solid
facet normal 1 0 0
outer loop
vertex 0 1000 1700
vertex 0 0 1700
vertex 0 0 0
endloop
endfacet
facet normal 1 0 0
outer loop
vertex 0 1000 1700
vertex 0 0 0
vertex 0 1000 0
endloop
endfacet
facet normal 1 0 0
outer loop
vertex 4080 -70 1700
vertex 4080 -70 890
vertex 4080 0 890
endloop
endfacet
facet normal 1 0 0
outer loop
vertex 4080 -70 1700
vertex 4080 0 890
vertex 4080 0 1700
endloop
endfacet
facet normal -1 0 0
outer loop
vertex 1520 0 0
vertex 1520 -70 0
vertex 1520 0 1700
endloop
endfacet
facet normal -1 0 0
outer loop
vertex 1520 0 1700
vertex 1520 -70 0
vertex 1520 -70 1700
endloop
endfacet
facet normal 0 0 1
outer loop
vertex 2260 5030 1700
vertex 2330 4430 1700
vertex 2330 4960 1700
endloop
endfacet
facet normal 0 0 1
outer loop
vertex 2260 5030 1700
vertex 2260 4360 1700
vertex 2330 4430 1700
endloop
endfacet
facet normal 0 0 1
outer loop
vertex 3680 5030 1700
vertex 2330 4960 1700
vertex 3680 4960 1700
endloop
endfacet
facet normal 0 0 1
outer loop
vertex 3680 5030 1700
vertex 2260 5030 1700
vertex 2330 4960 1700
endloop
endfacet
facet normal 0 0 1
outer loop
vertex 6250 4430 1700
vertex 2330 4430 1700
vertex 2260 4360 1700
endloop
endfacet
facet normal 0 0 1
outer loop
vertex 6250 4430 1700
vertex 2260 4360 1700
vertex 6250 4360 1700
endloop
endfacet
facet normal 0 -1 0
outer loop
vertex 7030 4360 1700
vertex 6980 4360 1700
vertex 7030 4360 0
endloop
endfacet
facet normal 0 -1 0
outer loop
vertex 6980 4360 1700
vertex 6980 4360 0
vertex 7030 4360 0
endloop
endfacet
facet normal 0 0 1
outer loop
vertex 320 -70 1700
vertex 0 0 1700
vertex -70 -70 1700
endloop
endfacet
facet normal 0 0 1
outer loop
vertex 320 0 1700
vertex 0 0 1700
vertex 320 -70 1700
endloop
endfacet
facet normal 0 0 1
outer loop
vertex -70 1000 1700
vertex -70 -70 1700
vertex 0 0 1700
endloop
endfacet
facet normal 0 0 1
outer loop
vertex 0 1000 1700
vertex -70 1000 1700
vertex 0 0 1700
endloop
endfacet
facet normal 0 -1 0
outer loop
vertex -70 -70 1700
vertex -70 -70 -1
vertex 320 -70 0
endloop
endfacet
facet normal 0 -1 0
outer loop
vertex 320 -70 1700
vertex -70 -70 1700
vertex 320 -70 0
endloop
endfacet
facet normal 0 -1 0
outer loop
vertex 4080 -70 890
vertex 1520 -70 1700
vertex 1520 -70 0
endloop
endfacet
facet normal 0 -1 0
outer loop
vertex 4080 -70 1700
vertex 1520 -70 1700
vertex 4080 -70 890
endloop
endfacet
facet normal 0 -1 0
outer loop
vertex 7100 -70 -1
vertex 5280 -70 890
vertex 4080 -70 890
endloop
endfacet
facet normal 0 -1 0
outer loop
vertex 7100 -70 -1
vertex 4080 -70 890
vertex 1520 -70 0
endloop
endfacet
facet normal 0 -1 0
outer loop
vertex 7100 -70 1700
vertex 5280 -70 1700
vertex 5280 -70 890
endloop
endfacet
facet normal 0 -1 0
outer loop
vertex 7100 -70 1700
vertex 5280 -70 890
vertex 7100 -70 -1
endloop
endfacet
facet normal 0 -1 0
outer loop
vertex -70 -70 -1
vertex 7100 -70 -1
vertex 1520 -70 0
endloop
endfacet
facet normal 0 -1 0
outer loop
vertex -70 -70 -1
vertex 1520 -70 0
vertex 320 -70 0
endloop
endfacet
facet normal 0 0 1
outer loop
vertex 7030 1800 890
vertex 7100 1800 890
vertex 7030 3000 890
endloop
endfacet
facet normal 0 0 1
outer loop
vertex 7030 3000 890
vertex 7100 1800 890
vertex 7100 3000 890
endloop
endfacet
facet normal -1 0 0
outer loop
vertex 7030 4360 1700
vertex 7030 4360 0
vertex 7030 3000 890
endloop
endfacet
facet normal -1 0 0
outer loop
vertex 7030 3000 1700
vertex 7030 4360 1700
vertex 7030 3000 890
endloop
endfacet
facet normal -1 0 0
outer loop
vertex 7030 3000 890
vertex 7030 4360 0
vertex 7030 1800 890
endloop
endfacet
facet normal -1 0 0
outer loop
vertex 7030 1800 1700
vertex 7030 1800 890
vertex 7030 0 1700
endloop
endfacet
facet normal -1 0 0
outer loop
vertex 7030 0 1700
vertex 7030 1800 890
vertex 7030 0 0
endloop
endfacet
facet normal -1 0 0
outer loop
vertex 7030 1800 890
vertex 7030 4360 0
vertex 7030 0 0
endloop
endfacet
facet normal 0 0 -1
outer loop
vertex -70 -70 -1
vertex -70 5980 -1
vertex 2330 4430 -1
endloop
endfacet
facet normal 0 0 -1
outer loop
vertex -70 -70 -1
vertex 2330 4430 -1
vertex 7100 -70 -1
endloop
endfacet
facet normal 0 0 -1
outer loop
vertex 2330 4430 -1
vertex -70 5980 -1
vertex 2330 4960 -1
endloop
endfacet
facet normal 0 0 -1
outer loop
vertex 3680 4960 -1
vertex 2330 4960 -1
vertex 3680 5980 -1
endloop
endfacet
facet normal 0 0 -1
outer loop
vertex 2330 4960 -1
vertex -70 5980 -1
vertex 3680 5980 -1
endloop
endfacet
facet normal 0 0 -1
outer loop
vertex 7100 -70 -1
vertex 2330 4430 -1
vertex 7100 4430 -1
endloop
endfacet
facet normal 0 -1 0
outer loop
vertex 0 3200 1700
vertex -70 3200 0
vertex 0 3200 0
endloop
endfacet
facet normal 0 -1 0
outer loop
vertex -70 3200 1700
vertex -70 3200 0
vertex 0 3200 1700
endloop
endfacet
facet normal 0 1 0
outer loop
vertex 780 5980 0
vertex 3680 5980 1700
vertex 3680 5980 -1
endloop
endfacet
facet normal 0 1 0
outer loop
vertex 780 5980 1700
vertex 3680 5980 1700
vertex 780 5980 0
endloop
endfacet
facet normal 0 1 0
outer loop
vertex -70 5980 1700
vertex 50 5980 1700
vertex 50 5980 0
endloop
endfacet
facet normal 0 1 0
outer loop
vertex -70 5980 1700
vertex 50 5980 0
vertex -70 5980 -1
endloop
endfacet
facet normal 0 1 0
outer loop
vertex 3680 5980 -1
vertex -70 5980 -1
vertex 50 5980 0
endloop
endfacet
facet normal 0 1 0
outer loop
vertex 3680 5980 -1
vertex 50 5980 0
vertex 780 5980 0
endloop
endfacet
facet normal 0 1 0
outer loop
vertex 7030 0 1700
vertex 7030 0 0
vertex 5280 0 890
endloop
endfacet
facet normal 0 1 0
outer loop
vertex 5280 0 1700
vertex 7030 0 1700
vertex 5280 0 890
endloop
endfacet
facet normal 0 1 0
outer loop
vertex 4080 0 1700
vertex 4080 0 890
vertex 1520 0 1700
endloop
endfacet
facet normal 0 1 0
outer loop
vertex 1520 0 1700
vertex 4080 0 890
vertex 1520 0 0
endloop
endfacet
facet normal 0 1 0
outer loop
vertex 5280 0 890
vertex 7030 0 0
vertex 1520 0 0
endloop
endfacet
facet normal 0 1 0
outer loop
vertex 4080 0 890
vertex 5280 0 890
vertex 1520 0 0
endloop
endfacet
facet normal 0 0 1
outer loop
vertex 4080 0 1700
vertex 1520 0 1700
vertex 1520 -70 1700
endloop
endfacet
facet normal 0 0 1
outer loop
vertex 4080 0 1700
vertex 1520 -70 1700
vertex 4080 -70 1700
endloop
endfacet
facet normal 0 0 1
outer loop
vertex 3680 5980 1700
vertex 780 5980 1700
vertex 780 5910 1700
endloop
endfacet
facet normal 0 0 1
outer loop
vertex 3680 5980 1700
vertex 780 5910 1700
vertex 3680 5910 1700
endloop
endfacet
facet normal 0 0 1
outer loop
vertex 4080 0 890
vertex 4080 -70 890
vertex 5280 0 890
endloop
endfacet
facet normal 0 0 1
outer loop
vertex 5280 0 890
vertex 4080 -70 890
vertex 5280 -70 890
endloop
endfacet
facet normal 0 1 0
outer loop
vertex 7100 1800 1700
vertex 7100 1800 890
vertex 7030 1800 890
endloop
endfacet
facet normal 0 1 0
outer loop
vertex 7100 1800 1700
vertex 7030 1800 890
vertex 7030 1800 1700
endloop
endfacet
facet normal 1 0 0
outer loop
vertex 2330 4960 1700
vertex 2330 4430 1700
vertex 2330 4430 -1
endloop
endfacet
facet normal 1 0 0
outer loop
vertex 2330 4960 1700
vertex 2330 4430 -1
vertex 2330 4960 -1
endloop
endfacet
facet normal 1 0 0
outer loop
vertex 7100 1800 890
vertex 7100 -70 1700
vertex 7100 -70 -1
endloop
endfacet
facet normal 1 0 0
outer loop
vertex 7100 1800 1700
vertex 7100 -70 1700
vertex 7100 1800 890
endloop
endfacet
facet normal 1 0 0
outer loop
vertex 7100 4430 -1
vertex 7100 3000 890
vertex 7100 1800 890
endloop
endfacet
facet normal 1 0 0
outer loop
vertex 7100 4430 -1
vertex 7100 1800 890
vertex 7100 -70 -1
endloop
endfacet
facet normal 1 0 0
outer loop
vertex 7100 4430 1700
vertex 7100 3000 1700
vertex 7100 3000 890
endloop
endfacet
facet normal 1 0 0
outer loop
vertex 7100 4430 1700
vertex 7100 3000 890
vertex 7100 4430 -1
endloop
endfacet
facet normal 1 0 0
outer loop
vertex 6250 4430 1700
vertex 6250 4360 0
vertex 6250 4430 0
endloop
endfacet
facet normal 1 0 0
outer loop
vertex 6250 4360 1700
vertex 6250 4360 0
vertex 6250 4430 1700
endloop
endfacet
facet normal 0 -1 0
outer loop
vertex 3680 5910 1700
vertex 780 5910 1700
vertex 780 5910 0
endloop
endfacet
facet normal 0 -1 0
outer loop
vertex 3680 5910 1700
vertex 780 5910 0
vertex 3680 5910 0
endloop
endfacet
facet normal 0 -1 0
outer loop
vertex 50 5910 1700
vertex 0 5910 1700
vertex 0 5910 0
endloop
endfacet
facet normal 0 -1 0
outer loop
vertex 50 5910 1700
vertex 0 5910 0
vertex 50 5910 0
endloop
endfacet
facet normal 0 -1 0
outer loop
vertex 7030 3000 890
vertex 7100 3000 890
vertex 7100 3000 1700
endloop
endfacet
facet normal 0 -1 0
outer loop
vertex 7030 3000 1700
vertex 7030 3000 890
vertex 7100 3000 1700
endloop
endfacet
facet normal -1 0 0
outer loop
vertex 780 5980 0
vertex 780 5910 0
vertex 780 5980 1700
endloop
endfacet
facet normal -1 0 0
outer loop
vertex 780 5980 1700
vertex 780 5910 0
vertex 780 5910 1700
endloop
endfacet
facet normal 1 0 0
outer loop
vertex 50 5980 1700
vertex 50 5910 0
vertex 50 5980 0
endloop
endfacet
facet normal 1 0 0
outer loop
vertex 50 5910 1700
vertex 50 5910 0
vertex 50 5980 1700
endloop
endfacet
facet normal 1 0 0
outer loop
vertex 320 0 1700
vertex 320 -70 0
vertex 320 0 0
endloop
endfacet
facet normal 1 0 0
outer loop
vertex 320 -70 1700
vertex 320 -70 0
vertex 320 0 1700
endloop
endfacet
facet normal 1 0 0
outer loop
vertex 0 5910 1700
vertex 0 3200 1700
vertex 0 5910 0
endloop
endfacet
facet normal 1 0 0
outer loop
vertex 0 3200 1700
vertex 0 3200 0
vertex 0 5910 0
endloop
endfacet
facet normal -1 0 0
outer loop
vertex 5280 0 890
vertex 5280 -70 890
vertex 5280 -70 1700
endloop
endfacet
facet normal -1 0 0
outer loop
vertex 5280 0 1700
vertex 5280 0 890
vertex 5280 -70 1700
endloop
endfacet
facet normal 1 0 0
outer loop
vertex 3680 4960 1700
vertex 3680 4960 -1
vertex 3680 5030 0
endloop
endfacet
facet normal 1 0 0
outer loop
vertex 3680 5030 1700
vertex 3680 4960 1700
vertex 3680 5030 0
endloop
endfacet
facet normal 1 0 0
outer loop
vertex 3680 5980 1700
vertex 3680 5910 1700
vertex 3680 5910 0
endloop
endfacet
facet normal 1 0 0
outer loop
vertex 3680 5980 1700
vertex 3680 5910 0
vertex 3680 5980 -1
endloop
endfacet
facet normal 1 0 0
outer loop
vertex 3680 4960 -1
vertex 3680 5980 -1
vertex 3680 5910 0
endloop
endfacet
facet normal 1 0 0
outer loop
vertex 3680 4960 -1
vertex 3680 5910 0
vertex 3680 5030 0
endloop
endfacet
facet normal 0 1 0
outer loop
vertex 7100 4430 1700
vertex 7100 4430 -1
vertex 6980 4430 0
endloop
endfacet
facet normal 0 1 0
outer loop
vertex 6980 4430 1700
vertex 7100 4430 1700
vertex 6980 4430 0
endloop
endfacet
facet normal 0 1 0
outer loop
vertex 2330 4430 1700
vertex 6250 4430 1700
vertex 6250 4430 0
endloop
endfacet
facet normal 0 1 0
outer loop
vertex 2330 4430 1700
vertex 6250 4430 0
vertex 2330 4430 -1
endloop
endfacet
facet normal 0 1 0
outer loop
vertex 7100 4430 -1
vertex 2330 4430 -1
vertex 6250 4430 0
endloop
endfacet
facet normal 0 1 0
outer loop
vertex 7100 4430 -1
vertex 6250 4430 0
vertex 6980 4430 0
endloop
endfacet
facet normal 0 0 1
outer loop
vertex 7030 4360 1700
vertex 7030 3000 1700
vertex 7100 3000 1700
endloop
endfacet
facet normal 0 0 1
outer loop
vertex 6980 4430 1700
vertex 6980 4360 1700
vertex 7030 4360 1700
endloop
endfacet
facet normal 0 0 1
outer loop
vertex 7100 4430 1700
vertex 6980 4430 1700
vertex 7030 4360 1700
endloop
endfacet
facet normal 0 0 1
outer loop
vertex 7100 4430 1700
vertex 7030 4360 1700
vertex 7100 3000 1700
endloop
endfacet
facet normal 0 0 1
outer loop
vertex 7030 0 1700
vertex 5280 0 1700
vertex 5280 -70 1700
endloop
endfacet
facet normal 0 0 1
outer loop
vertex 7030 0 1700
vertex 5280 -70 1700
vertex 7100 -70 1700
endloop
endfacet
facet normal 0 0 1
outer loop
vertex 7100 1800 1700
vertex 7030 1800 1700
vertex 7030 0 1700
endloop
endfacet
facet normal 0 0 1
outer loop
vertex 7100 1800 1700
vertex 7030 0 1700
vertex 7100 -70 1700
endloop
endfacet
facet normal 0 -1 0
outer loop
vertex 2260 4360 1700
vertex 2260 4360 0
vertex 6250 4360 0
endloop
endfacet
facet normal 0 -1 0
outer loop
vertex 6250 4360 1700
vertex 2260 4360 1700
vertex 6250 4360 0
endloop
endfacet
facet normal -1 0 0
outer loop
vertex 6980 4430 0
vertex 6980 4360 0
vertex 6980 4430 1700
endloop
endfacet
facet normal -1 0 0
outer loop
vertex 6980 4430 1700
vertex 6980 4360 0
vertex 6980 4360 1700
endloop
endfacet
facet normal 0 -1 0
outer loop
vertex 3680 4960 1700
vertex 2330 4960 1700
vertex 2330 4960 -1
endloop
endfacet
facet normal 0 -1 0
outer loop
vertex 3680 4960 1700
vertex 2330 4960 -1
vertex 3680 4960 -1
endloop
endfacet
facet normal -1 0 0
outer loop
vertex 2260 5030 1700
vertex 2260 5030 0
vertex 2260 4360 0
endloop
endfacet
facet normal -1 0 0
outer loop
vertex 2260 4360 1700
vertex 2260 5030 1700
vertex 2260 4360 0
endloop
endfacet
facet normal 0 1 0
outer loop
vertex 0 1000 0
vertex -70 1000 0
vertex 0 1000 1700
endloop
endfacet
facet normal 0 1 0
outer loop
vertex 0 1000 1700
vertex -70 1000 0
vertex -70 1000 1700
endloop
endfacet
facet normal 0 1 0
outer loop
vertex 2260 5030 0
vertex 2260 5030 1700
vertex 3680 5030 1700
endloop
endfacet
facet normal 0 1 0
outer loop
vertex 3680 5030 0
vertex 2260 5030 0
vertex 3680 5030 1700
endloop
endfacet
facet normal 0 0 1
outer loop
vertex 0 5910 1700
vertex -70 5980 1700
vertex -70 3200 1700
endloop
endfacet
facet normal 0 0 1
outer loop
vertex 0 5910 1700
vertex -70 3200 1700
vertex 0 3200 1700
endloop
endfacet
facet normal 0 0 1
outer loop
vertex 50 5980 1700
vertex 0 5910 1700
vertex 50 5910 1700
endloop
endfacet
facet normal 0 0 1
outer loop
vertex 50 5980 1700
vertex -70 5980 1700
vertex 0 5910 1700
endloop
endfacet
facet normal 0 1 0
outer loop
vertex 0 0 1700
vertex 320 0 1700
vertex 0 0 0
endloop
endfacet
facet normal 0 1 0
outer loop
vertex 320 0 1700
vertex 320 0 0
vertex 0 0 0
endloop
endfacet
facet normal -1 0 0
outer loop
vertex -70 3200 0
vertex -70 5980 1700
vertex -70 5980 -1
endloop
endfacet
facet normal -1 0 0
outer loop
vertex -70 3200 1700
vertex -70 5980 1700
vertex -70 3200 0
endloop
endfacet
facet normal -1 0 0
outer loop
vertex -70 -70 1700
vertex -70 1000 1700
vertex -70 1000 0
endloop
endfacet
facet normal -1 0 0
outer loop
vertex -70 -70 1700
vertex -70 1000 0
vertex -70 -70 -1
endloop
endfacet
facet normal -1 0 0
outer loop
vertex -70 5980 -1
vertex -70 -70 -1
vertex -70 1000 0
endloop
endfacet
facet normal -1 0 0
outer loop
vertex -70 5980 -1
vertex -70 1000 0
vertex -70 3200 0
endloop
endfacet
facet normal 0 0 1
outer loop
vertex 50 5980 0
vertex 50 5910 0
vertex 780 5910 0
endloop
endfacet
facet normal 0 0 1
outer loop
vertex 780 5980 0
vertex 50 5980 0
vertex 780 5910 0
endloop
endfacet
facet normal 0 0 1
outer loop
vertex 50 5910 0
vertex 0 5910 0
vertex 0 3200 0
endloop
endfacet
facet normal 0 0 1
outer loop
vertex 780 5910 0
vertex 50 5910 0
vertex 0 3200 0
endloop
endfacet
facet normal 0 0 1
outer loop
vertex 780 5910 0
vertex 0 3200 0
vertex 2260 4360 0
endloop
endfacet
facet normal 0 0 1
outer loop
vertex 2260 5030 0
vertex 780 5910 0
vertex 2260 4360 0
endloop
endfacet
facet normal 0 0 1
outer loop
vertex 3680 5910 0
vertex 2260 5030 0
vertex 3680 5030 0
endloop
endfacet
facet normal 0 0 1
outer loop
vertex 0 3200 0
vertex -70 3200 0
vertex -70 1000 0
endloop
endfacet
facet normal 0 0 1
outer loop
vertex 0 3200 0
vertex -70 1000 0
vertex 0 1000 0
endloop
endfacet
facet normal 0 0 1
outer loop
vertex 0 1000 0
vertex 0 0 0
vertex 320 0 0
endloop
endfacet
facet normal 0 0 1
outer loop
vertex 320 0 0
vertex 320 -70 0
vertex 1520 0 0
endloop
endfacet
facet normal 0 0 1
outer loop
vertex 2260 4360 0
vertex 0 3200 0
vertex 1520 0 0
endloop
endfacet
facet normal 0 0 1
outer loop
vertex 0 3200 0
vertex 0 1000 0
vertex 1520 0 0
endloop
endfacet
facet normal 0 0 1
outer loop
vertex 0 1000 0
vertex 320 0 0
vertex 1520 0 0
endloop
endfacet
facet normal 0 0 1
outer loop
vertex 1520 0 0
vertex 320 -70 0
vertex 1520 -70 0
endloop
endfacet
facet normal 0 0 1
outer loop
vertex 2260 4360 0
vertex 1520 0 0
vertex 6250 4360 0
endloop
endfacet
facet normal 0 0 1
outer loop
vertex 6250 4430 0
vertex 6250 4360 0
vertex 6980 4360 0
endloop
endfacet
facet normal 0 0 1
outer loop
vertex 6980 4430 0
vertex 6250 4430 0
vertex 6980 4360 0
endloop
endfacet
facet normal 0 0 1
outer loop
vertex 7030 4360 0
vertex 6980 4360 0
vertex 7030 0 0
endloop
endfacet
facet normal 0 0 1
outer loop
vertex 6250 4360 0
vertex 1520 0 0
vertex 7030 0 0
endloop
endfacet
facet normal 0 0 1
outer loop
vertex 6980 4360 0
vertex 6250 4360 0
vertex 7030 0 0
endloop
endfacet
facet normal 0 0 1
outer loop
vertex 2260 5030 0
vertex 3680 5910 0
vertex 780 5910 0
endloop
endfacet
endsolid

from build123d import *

# Parameters (mm, degrees)
F1_DEPTH  = 2700
F3_DEPTH  = 1
F4_W      = 1200
F4_H      = 2320
F4_H_2    = 1400
F5_DEPTH  = 70
F6_W      = 1200
F6_H      = 1400
F7_DEPTH  = 70
F8_W      = 2200
F8_H      = 2100
F9_DEPTH  = 70
F10_W     = 730
F10_H     = 2040
F11_DEPTH = 1620
F12_W     = 70
F12_H     = 880
F13_DEPTH = 2700
F15_DEPTH = 1000


with BuildPart() as f1:
    # F0 (on Top) → F1 (new body)
    with BuildSketch(Plane.XY):
        Polygon((2330, 4960), (3680, 4960), (3680, 5980), (-70, 5980), (-70, -70), (7100, -70), (7100, 4430), (2330, 4430), align=None)
        Polygon((7030, 0), (0, 0), (0, 5910), (3610, 5910), (3610, 5030), (2260, 5030), (2260, 4360), (7030, 4360), align=None, mode=Mode.SUBTRACT)
    extrude(amount=F1_DEPTH)

    # F2 (on Top) → F3 (join)
    with BuildSketch(Plane.XY):
        Polygon((3680, 5980), (-70, 5980), (-70, -70), (7100, -70), (7100, 4430), (2330, 4430), (2330, 4960), (3680, 4960), align=None)
    extrude(amount=-F3_DEPTH)

    # F4 (on face) → F5 (cut)
    with BuildSketch(Plane.XZ.offset(70)):
        with Locations((920, 1160)):
            Rectangle(F4_W, F4_H)
        with Locations((4680, 1590)):
            Rectangle(F4_W, F4_H_2)
    extrude(amount=-F5_DEPTH, mode=Mode.SUBTRACT)

    # F6 (on face) → F7 (cut)
    with BuildSketch(Plane.YZ.offset(7100)):
        with Locations((2400, 1590)):
            Rectangle(F6_W, F6_H)
    extrude(amount=-F7_DEPTH, mode=Mode.SUBTRACT)

    # F8 (on face) → F9 (cut)
    with BuildSketch(Plane(origin=(-70, 0, 0), x_dir=(0, -1, 0), z_dir=(-1, 0, 0))):
        with Locations((-2100, 1050)):
            Rectangle(F8_W, F8_H)
    extrude(amount=-F9_DEPTH, mode=Mode.SUBTRACT)

    # F10 (on face) → F11 (cut, through all)
    with BuildSketch(Plane.XZ.offset(-4360)):
        with Locations((6615, 1020)):
            Rectangle(F10_W, F10_H)
        with Locations((415, 1020)):
            Rectangle(F10_W, F10_H)
    extrude(amount=-F11_DEPTH, mode=Mode.SUBTRACT)

    # F12 (on face) → F13 (cut, through all)
    with BuildSketch(Plane.XY.offset(2700)):
        with Locations((3645, 5470)):
            Rectangle(F12_W, F12_H)
    extrude(amount=-F13_DEPTH, mode=Mode.SUBTRACT)

    # F14 (on face) → F15 (cut)
    with BuildSketch(Plane.XY.offset(2700)):
        Polygon((-70, 5980), (-70, -70), (7100, -70), (7100, 4430), (3680, 5980), align=None)
    extrude(amount=-F15_DEPTH, mode=Mode.SUBTRACT)


solid = f1.part
